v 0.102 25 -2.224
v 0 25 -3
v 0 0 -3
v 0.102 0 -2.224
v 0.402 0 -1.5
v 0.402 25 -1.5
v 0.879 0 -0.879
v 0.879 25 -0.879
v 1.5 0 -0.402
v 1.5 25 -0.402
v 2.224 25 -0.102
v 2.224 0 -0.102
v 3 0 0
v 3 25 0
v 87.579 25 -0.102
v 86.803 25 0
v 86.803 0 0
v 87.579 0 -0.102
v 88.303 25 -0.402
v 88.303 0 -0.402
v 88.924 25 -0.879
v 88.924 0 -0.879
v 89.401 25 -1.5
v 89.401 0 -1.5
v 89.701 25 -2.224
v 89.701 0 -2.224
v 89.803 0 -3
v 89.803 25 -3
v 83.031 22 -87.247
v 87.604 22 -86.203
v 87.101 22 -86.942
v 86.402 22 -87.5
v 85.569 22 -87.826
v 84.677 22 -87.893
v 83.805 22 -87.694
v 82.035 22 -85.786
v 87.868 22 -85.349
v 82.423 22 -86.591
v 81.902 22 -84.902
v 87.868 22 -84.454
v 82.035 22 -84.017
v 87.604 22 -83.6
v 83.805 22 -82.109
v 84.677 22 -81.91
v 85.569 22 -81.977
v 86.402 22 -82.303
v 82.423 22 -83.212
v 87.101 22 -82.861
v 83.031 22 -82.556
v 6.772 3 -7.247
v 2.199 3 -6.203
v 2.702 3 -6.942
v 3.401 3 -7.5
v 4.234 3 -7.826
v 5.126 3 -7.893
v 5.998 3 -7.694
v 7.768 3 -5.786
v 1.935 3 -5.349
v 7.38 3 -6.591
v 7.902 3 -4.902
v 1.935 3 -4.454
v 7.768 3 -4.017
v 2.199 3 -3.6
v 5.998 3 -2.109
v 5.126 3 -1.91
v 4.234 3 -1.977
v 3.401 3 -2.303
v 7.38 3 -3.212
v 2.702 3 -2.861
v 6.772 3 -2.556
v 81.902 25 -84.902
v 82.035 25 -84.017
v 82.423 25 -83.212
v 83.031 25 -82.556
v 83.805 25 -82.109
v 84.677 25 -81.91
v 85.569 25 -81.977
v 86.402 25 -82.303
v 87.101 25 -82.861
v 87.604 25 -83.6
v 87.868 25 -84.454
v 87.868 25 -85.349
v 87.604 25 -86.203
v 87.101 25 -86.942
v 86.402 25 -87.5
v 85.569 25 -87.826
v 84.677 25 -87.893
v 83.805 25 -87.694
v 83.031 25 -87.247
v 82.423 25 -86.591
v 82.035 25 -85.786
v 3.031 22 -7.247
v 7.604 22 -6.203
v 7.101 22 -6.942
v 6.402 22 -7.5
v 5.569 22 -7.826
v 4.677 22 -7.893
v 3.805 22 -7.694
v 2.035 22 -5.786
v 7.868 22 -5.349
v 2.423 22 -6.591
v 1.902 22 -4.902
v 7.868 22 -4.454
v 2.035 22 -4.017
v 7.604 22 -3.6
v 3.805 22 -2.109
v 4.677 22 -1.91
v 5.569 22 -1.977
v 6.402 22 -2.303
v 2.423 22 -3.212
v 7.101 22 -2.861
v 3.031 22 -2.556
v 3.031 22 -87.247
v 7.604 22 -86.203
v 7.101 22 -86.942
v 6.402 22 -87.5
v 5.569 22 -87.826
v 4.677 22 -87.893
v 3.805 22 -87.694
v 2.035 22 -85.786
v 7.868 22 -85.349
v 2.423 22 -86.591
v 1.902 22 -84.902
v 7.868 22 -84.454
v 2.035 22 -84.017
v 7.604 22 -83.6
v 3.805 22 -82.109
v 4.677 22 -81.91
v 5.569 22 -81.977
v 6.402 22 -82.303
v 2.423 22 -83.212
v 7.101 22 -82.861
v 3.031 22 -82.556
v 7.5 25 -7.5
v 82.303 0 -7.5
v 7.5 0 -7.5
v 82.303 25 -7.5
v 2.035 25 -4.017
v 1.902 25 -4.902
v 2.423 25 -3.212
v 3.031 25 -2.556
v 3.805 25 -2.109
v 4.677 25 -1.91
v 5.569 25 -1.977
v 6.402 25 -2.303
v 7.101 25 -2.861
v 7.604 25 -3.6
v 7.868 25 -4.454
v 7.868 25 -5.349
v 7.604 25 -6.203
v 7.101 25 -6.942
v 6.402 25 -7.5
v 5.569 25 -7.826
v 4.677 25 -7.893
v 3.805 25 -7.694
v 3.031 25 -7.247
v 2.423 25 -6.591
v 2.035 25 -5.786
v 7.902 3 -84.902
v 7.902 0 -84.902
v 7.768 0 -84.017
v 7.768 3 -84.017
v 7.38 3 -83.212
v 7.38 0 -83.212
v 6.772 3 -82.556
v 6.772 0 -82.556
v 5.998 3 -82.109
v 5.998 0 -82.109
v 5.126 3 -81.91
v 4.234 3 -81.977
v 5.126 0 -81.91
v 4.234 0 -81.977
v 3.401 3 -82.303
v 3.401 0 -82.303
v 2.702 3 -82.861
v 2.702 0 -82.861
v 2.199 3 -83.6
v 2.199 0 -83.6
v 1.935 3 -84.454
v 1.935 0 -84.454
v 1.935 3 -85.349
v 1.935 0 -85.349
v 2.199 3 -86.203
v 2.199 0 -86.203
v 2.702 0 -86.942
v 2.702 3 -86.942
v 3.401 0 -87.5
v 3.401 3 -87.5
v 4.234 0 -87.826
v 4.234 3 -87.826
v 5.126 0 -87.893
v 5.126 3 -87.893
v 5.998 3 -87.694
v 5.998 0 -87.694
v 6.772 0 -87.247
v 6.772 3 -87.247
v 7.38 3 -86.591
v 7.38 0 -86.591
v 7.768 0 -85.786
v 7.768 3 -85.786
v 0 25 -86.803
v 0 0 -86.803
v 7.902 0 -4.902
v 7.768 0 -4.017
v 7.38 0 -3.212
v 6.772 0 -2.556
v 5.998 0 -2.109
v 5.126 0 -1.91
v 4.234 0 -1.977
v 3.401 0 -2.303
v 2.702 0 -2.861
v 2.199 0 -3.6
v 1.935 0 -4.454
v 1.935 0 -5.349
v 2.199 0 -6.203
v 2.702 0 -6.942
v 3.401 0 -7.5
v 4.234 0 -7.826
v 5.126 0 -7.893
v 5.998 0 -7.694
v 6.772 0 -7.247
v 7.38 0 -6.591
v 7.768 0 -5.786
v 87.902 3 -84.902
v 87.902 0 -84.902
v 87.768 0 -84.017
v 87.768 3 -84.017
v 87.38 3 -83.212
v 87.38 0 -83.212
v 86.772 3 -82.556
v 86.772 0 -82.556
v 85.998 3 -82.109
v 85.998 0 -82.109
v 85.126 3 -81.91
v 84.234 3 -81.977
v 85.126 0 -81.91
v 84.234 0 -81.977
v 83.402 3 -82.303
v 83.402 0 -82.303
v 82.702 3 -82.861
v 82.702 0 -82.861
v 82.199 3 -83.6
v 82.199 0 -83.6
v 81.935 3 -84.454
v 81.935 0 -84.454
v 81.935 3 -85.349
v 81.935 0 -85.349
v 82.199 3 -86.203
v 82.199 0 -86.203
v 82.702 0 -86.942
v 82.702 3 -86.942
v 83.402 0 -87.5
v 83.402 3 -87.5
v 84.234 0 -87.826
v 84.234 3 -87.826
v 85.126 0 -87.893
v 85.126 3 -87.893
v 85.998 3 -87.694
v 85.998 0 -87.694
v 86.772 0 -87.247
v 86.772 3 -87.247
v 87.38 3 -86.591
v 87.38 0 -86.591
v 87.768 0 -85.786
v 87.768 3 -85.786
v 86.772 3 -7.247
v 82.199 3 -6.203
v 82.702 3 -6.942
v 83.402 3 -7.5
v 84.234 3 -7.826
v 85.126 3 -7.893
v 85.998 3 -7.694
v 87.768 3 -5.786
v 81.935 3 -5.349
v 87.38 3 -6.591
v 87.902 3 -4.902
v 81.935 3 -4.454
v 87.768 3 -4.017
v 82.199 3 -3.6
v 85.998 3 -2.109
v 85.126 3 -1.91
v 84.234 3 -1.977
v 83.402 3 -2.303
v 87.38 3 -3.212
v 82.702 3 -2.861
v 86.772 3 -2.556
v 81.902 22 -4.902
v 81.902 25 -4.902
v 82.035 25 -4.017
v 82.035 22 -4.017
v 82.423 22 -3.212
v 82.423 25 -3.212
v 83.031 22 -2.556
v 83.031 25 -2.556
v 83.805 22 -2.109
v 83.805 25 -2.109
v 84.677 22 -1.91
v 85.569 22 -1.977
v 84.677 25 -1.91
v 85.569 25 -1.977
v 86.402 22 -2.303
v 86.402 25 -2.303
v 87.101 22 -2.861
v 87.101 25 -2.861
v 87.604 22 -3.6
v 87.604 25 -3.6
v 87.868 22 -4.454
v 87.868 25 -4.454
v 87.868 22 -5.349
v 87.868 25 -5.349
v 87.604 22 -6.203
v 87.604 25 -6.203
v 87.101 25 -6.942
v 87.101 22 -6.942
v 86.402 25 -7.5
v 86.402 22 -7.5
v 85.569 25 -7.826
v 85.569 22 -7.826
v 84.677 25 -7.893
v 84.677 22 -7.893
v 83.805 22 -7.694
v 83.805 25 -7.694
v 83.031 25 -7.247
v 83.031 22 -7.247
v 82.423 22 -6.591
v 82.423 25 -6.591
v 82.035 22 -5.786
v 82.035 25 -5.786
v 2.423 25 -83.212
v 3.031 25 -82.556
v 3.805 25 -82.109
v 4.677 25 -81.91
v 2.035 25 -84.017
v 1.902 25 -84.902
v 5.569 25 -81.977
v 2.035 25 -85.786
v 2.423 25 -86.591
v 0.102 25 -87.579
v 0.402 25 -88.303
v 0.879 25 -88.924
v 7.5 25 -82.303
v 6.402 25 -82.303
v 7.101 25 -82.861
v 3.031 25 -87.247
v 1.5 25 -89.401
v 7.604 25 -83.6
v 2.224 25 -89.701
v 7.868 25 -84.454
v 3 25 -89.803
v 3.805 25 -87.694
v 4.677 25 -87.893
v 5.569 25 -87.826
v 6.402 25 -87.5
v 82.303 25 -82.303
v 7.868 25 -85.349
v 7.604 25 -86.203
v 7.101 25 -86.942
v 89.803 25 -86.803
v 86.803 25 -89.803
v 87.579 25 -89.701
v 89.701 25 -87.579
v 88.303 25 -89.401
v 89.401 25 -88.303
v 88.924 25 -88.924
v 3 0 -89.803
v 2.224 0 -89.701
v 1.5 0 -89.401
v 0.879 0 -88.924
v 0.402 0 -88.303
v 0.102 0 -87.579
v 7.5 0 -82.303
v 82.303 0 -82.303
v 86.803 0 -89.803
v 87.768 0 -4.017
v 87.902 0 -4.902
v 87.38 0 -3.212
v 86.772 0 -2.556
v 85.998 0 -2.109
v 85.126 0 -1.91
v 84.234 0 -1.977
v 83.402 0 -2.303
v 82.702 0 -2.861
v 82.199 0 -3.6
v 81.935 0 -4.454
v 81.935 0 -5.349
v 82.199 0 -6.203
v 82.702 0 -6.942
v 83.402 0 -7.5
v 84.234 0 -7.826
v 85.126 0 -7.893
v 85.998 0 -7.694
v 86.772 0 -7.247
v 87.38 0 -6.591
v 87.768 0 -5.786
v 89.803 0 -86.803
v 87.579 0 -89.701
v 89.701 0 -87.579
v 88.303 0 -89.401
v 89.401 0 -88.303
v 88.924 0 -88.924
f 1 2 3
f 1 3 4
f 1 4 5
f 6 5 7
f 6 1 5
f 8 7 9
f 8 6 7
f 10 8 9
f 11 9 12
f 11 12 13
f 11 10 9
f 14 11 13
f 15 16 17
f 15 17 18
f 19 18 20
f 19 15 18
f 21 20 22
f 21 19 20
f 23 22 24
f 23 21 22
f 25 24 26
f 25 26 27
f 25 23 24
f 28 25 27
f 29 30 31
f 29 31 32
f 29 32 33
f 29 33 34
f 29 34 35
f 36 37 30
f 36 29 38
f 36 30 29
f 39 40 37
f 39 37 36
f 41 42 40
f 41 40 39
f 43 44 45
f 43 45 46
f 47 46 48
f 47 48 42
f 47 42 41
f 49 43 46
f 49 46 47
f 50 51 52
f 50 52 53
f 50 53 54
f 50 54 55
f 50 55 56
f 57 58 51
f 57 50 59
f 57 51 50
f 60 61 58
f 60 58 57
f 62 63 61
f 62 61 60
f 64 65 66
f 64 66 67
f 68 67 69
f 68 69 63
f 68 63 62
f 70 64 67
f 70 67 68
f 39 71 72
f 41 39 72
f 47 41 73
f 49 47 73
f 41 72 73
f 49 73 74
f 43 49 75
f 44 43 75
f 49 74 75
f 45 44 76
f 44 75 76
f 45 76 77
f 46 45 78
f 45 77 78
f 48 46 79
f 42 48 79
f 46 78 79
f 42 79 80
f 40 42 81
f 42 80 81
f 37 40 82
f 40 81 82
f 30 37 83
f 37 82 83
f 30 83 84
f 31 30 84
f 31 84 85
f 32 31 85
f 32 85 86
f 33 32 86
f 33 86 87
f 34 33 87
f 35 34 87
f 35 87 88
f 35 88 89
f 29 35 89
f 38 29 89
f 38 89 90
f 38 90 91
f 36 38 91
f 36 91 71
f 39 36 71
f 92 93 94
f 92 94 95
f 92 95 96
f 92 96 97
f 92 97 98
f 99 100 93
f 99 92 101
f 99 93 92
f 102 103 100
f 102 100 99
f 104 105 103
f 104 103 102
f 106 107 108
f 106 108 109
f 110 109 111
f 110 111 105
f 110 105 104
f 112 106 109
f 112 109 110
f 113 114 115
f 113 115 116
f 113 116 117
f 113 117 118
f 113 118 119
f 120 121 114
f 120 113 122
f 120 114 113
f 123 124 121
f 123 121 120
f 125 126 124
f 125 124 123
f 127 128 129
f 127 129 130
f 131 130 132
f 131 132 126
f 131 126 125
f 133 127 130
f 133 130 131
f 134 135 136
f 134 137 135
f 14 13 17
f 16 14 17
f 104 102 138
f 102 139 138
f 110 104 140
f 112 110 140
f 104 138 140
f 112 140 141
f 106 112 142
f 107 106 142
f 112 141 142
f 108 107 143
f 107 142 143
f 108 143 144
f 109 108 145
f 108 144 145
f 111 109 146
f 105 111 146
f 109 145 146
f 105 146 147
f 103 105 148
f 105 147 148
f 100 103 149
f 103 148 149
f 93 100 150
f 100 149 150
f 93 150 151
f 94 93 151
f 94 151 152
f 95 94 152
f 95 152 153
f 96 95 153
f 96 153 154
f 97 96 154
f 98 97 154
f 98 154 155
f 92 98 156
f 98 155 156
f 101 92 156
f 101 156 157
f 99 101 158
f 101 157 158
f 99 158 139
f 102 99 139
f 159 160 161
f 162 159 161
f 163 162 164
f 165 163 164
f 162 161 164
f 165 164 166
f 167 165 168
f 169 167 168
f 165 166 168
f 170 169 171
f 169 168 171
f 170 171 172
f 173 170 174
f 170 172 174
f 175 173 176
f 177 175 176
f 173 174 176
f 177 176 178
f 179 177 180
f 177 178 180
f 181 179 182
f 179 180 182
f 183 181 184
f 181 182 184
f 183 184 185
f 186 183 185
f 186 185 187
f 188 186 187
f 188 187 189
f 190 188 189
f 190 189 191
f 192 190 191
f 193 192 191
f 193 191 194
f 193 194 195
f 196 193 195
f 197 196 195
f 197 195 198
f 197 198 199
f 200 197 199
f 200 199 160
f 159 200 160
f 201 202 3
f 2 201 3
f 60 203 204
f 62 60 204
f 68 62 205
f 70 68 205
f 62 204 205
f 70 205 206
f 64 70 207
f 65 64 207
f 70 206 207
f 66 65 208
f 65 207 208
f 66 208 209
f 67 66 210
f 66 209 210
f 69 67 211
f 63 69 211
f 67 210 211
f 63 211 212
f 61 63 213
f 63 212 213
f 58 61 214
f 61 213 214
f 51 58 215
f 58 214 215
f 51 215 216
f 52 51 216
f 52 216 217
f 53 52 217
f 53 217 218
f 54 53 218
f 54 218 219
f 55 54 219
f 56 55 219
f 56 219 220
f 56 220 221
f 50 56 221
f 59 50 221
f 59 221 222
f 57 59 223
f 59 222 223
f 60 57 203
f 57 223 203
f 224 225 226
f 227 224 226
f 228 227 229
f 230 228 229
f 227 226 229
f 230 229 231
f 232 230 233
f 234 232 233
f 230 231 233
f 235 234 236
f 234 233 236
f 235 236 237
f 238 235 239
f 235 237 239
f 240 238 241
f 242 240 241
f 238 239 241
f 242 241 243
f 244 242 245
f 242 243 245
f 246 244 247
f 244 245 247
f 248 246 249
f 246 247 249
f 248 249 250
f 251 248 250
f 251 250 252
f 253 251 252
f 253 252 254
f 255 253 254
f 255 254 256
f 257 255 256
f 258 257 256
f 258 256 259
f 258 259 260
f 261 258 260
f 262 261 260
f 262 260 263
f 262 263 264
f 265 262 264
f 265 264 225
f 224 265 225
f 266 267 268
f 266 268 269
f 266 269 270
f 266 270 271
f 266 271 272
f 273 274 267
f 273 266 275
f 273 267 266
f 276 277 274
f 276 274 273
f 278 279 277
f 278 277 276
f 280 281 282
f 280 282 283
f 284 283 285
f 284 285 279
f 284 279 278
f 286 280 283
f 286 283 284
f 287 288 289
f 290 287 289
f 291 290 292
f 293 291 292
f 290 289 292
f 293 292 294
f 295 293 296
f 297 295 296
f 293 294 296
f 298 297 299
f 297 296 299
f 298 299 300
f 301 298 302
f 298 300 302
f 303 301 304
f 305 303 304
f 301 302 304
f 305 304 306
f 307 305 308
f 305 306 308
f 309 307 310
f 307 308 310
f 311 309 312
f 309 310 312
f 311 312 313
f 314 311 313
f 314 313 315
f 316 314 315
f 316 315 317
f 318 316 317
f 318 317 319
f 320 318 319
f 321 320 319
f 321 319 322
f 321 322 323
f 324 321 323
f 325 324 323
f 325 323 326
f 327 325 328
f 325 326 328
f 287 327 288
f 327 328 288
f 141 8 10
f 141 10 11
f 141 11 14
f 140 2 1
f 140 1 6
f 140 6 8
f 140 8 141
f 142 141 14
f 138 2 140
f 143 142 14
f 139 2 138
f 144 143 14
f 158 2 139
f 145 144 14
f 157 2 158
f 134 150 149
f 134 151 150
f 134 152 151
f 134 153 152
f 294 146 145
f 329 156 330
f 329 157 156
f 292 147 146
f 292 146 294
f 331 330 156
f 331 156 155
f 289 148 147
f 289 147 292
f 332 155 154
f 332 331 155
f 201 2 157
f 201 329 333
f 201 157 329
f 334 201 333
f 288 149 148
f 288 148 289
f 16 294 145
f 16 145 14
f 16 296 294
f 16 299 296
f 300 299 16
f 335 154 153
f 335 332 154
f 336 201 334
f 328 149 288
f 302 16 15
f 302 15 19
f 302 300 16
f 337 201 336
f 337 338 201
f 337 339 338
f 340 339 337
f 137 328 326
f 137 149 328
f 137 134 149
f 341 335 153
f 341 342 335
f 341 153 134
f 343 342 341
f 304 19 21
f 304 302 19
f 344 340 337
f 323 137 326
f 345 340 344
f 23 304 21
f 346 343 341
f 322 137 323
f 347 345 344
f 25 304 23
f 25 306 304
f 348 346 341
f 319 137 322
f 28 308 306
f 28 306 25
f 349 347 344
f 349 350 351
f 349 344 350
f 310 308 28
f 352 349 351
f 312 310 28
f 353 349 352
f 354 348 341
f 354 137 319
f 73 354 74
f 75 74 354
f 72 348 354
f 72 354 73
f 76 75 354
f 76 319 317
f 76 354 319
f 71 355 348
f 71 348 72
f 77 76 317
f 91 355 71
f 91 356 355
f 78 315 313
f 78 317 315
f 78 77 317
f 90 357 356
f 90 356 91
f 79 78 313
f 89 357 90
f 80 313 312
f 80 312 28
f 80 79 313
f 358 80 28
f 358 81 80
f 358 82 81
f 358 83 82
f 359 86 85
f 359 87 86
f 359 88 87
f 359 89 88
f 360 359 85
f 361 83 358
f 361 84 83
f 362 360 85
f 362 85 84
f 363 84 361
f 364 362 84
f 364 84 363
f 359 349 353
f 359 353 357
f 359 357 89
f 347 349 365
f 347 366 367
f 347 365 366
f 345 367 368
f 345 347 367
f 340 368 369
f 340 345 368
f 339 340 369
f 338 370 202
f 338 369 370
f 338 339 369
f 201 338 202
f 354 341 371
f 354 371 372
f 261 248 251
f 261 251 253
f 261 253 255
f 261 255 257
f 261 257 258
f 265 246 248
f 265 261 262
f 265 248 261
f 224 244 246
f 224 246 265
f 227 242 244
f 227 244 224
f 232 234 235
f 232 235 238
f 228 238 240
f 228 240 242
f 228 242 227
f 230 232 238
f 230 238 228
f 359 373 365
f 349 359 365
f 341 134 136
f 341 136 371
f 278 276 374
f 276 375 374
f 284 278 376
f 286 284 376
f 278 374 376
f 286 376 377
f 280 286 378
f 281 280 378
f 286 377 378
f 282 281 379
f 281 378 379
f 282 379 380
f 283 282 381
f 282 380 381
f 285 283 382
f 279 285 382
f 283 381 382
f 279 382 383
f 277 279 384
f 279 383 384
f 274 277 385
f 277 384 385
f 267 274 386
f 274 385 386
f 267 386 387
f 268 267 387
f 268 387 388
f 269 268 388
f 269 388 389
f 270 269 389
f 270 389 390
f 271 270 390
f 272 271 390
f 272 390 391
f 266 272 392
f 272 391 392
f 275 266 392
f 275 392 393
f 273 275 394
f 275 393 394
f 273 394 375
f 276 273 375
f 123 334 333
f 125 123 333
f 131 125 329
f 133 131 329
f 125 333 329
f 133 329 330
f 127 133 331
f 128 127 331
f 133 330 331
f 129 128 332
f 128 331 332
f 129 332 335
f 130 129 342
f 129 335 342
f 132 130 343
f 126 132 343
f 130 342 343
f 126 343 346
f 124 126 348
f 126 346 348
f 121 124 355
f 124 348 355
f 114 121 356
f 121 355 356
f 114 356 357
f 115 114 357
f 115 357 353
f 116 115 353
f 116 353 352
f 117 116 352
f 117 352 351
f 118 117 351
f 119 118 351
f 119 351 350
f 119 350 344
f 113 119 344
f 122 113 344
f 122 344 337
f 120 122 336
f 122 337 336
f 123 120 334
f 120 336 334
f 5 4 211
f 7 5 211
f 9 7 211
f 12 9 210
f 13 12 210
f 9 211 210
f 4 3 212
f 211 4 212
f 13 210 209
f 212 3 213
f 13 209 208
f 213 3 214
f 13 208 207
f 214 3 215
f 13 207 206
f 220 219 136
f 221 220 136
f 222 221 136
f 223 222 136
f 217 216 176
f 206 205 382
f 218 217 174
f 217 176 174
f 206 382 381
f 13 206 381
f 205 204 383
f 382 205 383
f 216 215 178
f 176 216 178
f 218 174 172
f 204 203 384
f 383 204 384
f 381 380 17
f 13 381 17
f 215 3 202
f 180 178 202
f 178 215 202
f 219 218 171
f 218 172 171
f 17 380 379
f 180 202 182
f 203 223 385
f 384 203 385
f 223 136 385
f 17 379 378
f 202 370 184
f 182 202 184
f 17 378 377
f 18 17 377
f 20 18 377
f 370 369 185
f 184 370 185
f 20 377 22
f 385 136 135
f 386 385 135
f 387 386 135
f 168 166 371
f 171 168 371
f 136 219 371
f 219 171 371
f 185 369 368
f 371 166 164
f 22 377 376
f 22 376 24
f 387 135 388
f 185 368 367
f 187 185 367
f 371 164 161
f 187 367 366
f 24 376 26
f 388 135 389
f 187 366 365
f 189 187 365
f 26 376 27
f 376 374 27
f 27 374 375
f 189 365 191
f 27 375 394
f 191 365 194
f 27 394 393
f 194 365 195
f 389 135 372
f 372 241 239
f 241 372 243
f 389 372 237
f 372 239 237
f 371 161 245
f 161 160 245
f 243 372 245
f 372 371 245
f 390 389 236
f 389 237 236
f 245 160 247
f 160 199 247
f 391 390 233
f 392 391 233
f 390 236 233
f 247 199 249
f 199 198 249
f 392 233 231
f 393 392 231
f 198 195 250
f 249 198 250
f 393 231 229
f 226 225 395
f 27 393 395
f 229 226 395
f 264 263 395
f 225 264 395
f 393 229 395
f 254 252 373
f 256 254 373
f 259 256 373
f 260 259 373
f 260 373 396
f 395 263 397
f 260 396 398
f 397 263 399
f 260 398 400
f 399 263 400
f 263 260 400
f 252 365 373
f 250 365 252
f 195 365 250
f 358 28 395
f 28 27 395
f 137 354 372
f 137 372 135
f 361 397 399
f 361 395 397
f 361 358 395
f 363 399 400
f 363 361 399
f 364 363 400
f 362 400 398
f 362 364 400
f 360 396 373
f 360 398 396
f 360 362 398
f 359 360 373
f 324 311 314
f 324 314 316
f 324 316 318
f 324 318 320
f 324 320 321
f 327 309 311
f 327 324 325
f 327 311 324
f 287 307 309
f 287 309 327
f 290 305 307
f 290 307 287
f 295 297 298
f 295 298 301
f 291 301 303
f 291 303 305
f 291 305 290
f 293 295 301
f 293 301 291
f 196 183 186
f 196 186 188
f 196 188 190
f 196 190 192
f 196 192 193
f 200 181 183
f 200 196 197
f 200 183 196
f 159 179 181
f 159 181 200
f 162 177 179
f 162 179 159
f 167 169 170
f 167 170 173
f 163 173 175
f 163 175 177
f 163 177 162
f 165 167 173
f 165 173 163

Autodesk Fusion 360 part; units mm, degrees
sketch "Sketch1" plane through (0, 0, 0) normal (0, 1, 0) x (1, 0, 0)
  line L0 (0, 0) -> (89.803, 0)
  line L1 (89.803, 0) -> (89.803, 89.803)
  line L2 (89.803, 89.803) -> (0, 89.803)
  line L3 (0, 89.803) -> (0, 0)
  dimension "d1" = 89.803
  dimension "d2" = 89.803
extrude "Extrude1" add sketch "Sketch1" along normal blind 25 makes body 1
sketch "Sketch4" plane through (0, 25, 0) normal (0, 1, 0) x (-1, 0, 0)
  line L0 (0, -89.803) -> (0, 0)
  line L1 (0, 0) -> (-89.803, 0)
  line L2 (-89.803, 0) -> (-89.803, -89.803)
  line L3 (-89.803, -89.803) -> (0, -89.803)
  line L4 (-78.303, -78.303) -> (-11.5, -78.303)
  line L5 (-11.5, -78.303) -> (-11.5, -11.5)
  line L6 (-11.5, -11.5) -> (-78.303, -11.5)
  line L7 (-78.303, -11.5) -> (-78.303, -78.303)
  line L8 (-78.303, -78.303) -> (-11.5, -11.5) construction
  line L9 (-11.5, -78.303) -> (-78.303, -11.5) construction
  point P0 (-44.9015, -44.9015)
  dimension "d10" = 66.803
  dimension "d11" = 66.803
extrude "Extrude3" cut sketch "Sketch4" against normal blind 50 contours L4 L5 L6 L7 bodies 1
fillet "Fillet2" radius 3 4 edges at (0, 12.5, 0) (89.803, 12.5, 0) (89.803, 12.5, -89.803) (0, 12.5, -89.803) on bodies 1
sketch "Sketch5" plane through (0, 25, 0) normal (0, 1, 0) x (-1, 0, 0)
  arc A0 (-3, -89.803) -> (0, -86.803) centre (-3, -86.803) ccw
  line L0 (0, -86.803) -> (0, -3)
  arc A1 (0, -3) -> (-3, 0) centre (-3, -3) ccw
  line L1 (-3, 0) -> (-86.803, 0)
  arc A2 (-86.803, 0) -> (-89.803, -3) centre (-86.803, -3) ccw
  line L2 (-89.803, -3) -> (-89.803, -86.803)
  arc A3 (-89.803, -86.803) -> (-86.803, -89.803) centre (-86.803, -86.803) ccw
  line L3 (-86.803, -89.803) -> (-3, -89.803)
  line L4 (-11.5, -78.303) -> (-78.303, -78.303)
  line L5 (-78.303, -78.303) -> (-78.303, -11.5)
  line L6 (-78.303, -11.5) -> (-11.5, -11.5)
  line L7 (-11.5, -11.5) -> (-11.5, -78.303)
copy_body "Body->Comp2" bodies 1 removing the originals makes body 2 in component "midbody2"
sketch "Sketch6" plane through (44.9015, 25, -44.9015) normal (0, 1, 0) x (-1, 0, 0)
  circle A0 centre (-40, 40) radius 3
  circle A1 centre (40, 40) radius 3
  circle A2 centre (-40, -40) radius 3
  circle A3 centre (40, -40) radius 3
  dimension "d15" = 6
  dimension "d16" = 6
  dimension "d17" = 6
  dimension "d18" = 6
extrude "Extrude1'" cut sketch "Sketch6" against normal blind 3 bodies 2 in component "midbody2"
sketch "Sketch7" plane through (0, 0, 0) normal (0, -1, 0) x (1, 0, 0)
  line L0 (78.303, -78.303) -> (11.5, -78.303)
  line L1 (11.5, -78.303) -> (11.5, -11.5)
  line L2 (11.5, -11.5) -> (78.303, -11.5)
  line L3 (78.303, -11.5) -> (78.303, -78.303)
  arc A0 (0, -86.803) -> (3, -89.803) centre (3, -86.803) ccw
  line L4 (3, -89.803) -> (86.803, -89.803)
  arc A1 (86.803, -89.803) -> (89.803, -86.803) centre (86.803, -86.803) ccw
  line L5 (89.803, -86.803) -> (89.803, -3)
  arc A2 (89.803, -3) -> (86.803, 0) centre (86.803, -3) ccw
  line L6 (86.803, 0) -> (3, 0)
  arc A3 (3, 0) -> (0, -3) centre (3, -3) ccw
  line L7 (0, -3) -> (0, -86.803)
sketch "Sketch8" plane through (44.9015, 0, -44.9015) normal (0, -1, 0) x (1, 0, 0)
  circle A0 centre (40, 40) radius 3
  circle A1 centre (40, -40) radius 3
  circle A2 centre (40, -40) radius 3
  circle A3 centre (-40, -40) radius 3
  circle A4 centre (-40, 40) radius 3
  point P0 (-37, -40)
  point P1 (-37, 40)
  dimension "d21" = 6
  dimension "d22" = 6
  dimension "d24" = 6
  dimension "d25" = 6
extrude "Extrude2" cut sketch "Sketch8" against normal blind 3 bodies 2 in component "midbody2"
sketch "Sketch9" plane through (0, 25, 0) normal (0, 1, 0) x (-1, 0, 0)
  line L0 (-89.803, -3) -> (-89.803, -86.803)
  line L1 (-89.803, -86.803) -> (-89.803, -3)
  line L2 (-86.803, -89.803) -> (-3, -89.803)
  line L3 (0, -86.803) -> (0, -3)
  line L4 (0, -3) -> (0, -86.803)
  line L5 (-3, 0) -> (-86.803, 0)
  line L6 (-86.803, 0) -> (-3, 0)
  line L7 (-75, -7.5) -> (-15, -7.5)
  line L8 (-7.5, -15) -> (-7.5, -75)
  line L9 (-10.5518, -82.303) -> (-78.7446, -82.303)
  line L10 (-82.303, -79.8784) -> (-82.303, -9.9962)
  line L11 (-82.303, -9.9962) -> (-82.303, -7.5)
  line L12 (-82.303, -7.5) -> (-75, -7.5)
  line L13 (-7.5, -15) -> (-7.5, -7.5)
  line L14 (-15, -7.5) -> (-7.5, -7.5)
  line L15 (-7.5, -75) -> (-7.5, -82.303)
  line L16 (-10.5518, -82.303) -> (-7.5, -82.303)
  line L17 (-78.7446, -82.303) -> (-82.303, -82.303)
  line L18 (-82.303, -79.8784) -> (-82.303, -82.303)
extrude "Extrude3'" cut sketch "Sketch9" against normal blind 300 bodies 2 in component "midbody2"
component "midbody2" placed x (1, 0, 0) y (0, 1, 0) z (0, 0, 1) at (0, 0, 0)
